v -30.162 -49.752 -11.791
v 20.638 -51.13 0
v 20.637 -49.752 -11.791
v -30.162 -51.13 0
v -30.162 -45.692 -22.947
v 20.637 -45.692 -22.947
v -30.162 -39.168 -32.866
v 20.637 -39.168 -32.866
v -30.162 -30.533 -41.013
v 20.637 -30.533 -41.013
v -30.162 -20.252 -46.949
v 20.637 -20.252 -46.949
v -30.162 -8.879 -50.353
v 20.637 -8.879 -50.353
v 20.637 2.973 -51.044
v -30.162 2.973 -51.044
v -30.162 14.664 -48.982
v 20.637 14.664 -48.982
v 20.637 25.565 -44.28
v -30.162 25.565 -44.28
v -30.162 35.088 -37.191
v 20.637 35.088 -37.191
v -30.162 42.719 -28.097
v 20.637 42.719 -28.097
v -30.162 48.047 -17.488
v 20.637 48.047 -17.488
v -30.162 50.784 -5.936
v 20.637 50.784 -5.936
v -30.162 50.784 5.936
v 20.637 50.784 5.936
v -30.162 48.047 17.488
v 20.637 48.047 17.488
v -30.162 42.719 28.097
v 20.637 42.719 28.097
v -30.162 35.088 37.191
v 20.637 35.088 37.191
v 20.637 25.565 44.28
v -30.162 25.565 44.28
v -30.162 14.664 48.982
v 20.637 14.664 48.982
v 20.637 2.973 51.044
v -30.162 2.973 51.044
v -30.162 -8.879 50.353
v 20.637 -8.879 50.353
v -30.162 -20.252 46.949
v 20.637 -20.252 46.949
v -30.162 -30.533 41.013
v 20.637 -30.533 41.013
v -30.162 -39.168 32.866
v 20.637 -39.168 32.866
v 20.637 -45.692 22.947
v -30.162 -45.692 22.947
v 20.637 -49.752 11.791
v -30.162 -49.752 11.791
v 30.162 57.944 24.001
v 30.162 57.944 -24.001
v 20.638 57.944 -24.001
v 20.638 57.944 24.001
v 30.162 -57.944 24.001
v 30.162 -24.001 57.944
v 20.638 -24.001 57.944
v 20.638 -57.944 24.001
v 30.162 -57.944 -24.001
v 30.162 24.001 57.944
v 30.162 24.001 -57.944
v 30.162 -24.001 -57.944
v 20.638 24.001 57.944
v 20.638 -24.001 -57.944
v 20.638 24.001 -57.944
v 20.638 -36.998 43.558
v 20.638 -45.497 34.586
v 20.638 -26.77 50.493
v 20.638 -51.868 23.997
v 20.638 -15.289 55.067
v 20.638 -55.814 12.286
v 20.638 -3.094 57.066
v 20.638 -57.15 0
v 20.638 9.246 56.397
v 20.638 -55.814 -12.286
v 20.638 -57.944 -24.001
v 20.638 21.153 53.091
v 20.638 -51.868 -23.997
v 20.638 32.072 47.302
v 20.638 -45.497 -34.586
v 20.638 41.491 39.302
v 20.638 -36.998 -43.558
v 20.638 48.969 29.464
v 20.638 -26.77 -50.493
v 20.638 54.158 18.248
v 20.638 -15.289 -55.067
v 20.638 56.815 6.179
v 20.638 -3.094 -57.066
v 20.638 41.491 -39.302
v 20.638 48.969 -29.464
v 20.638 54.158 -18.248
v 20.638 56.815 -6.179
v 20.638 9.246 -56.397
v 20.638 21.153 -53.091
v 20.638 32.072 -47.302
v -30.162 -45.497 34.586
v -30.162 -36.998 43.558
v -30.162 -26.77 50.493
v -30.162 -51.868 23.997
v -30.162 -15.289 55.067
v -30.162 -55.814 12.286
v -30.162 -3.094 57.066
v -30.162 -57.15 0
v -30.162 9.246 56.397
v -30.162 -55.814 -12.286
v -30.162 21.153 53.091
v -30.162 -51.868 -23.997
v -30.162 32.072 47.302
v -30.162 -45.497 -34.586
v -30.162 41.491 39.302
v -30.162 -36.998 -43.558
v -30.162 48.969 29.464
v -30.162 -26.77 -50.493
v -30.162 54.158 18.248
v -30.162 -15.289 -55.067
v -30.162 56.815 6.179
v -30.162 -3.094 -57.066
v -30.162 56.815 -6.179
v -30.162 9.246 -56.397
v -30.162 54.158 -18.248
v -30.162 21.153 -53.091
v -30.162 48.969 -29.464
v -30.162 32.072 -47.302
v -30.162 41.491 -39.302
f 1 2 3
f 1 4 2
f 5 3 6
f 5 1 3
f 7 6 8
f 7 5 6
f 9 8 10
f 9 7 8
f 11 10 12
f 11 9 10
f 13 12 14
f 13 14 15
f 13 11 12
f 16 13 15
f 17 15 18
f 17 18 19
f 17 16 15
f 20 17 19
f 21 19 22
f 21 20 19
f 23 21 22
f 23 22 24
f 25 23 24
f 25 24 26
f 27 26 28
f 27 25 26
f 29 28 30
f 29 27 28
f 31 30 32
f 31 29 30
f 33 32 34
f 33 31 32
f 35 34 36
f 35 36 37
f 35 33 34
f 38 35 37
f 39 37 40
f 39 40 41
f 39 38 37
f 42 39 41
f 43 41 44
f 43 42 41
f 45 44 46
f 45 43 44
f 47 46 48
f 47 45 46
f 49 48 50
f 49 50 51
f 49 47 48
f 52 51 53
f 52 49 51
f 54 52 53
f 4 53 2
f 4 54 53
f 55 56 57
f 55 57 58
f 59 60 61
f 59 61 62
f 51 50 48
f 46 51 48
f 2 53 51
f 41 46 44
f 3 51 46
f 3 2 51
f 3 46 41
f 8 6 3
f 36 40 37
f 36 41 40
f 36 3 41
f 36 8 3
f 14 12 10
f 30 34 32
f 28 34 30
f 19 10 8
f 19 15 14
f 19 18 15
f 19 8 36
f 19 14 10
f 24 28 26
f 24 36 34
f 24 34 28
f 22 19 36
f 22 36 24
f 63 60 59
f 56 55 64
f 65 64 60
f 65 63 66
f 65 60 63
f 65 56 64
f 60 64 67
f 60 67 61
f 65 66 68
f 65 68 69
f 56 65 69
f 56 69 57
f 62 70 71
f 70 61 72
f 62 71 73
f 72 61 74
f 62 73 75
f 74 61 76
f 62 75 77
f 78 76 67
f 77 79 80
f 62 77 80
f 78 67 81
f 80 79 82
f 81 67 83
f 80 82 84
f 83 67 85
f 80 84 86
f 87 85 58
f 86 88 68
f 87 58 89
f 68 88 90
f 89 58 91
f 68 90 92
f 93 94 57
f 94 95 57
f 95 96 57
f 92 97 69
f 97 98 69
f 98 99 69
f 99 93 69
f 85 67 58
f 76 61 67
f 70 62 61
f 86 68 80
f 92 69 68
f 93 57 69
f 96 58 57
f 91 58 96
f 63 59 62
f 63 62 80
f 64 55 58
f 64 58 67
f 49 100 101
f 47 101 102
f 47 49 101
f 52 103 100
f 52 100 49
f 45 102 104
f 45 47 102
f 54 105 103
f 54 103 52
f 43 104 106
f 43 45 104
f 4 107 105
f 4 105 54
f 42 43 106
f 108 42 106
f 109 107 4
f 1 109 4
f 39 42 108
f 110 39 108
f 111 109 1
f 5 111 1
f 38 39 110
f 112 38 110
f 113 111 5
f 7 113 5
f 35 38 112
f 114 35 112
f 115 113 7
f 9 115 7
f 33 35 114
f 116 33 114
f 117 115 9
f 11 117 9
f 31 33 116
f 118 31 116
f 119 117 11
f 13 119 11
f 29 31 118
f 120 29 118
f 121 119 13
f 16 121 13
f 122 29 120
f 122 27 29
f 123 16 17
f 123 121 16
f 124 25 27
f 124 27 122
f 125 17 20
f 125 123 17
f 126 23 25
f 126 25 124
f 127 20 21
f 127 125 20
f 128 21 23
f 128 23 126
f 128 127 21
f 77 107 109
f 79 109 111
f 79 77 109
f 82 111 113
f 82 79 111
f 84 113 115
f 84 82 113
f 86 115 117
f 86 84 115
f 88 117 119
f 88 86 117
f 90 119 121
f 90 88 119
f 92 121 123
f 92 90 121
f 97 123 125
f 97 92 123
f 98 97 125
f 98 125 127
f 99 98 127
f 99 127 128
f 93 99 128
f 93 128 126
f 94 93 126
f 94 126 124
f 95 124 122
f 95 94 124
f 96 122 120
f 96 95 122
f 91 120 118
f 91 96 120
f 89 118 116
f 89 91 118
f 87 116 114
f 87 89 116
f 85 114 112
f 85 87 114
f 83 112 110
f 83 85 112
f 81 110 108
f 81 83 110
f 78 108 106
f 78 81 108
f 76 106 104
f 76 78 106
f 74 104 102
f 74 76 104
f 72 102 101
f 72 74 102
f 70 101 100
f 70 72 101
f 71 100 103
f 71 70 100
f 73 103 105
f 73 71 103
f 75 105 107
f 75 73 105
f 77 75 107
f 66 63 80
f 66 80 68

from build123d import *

# Parameters (mm, degrees)
SKETCH2_R           = 57.15
BOSS_EXTRUDE1_DEPTH = 9.525


with BuildPart() as part:
    # Sketch1 → Revolve1 (revolve)
    with BuildSketch(Plane.XY):
        Polygon((-30.1625, -57.15), (30.1625, -57.15), (30.1625, 0), (20.6375, 0), (20.6375, -51.1302), (-30.1625, -51.1302), align=None)
    revolve(axis=Axis((-30.1625, 0, 0), (1, 0, 0)))

    # Sketch2 → Boss-Extrude1 (add)
    with BuildSketch(Plane(origin=(30.1625, 0, 0), x_dir=(0, 0, -1), z_dir=(1, 0, 0))):
        Polygon((-24.001087105, 57.94375), (-57.94375, 24.001087105), (-57.94375, -24.001087105), (-24.001087105, -57.94375), (24.001087105, -57.94375), (57.94375, -24.001087105), (57.94375, 24.001087105), (24.001087105, 57.94375), align=None)
        Circle(SKETCH2_R, mode=Mode.SUBTRACT)
    extrude(amount=-BOSS_EXTRUDE1_DEPTH)


solid = part.part
